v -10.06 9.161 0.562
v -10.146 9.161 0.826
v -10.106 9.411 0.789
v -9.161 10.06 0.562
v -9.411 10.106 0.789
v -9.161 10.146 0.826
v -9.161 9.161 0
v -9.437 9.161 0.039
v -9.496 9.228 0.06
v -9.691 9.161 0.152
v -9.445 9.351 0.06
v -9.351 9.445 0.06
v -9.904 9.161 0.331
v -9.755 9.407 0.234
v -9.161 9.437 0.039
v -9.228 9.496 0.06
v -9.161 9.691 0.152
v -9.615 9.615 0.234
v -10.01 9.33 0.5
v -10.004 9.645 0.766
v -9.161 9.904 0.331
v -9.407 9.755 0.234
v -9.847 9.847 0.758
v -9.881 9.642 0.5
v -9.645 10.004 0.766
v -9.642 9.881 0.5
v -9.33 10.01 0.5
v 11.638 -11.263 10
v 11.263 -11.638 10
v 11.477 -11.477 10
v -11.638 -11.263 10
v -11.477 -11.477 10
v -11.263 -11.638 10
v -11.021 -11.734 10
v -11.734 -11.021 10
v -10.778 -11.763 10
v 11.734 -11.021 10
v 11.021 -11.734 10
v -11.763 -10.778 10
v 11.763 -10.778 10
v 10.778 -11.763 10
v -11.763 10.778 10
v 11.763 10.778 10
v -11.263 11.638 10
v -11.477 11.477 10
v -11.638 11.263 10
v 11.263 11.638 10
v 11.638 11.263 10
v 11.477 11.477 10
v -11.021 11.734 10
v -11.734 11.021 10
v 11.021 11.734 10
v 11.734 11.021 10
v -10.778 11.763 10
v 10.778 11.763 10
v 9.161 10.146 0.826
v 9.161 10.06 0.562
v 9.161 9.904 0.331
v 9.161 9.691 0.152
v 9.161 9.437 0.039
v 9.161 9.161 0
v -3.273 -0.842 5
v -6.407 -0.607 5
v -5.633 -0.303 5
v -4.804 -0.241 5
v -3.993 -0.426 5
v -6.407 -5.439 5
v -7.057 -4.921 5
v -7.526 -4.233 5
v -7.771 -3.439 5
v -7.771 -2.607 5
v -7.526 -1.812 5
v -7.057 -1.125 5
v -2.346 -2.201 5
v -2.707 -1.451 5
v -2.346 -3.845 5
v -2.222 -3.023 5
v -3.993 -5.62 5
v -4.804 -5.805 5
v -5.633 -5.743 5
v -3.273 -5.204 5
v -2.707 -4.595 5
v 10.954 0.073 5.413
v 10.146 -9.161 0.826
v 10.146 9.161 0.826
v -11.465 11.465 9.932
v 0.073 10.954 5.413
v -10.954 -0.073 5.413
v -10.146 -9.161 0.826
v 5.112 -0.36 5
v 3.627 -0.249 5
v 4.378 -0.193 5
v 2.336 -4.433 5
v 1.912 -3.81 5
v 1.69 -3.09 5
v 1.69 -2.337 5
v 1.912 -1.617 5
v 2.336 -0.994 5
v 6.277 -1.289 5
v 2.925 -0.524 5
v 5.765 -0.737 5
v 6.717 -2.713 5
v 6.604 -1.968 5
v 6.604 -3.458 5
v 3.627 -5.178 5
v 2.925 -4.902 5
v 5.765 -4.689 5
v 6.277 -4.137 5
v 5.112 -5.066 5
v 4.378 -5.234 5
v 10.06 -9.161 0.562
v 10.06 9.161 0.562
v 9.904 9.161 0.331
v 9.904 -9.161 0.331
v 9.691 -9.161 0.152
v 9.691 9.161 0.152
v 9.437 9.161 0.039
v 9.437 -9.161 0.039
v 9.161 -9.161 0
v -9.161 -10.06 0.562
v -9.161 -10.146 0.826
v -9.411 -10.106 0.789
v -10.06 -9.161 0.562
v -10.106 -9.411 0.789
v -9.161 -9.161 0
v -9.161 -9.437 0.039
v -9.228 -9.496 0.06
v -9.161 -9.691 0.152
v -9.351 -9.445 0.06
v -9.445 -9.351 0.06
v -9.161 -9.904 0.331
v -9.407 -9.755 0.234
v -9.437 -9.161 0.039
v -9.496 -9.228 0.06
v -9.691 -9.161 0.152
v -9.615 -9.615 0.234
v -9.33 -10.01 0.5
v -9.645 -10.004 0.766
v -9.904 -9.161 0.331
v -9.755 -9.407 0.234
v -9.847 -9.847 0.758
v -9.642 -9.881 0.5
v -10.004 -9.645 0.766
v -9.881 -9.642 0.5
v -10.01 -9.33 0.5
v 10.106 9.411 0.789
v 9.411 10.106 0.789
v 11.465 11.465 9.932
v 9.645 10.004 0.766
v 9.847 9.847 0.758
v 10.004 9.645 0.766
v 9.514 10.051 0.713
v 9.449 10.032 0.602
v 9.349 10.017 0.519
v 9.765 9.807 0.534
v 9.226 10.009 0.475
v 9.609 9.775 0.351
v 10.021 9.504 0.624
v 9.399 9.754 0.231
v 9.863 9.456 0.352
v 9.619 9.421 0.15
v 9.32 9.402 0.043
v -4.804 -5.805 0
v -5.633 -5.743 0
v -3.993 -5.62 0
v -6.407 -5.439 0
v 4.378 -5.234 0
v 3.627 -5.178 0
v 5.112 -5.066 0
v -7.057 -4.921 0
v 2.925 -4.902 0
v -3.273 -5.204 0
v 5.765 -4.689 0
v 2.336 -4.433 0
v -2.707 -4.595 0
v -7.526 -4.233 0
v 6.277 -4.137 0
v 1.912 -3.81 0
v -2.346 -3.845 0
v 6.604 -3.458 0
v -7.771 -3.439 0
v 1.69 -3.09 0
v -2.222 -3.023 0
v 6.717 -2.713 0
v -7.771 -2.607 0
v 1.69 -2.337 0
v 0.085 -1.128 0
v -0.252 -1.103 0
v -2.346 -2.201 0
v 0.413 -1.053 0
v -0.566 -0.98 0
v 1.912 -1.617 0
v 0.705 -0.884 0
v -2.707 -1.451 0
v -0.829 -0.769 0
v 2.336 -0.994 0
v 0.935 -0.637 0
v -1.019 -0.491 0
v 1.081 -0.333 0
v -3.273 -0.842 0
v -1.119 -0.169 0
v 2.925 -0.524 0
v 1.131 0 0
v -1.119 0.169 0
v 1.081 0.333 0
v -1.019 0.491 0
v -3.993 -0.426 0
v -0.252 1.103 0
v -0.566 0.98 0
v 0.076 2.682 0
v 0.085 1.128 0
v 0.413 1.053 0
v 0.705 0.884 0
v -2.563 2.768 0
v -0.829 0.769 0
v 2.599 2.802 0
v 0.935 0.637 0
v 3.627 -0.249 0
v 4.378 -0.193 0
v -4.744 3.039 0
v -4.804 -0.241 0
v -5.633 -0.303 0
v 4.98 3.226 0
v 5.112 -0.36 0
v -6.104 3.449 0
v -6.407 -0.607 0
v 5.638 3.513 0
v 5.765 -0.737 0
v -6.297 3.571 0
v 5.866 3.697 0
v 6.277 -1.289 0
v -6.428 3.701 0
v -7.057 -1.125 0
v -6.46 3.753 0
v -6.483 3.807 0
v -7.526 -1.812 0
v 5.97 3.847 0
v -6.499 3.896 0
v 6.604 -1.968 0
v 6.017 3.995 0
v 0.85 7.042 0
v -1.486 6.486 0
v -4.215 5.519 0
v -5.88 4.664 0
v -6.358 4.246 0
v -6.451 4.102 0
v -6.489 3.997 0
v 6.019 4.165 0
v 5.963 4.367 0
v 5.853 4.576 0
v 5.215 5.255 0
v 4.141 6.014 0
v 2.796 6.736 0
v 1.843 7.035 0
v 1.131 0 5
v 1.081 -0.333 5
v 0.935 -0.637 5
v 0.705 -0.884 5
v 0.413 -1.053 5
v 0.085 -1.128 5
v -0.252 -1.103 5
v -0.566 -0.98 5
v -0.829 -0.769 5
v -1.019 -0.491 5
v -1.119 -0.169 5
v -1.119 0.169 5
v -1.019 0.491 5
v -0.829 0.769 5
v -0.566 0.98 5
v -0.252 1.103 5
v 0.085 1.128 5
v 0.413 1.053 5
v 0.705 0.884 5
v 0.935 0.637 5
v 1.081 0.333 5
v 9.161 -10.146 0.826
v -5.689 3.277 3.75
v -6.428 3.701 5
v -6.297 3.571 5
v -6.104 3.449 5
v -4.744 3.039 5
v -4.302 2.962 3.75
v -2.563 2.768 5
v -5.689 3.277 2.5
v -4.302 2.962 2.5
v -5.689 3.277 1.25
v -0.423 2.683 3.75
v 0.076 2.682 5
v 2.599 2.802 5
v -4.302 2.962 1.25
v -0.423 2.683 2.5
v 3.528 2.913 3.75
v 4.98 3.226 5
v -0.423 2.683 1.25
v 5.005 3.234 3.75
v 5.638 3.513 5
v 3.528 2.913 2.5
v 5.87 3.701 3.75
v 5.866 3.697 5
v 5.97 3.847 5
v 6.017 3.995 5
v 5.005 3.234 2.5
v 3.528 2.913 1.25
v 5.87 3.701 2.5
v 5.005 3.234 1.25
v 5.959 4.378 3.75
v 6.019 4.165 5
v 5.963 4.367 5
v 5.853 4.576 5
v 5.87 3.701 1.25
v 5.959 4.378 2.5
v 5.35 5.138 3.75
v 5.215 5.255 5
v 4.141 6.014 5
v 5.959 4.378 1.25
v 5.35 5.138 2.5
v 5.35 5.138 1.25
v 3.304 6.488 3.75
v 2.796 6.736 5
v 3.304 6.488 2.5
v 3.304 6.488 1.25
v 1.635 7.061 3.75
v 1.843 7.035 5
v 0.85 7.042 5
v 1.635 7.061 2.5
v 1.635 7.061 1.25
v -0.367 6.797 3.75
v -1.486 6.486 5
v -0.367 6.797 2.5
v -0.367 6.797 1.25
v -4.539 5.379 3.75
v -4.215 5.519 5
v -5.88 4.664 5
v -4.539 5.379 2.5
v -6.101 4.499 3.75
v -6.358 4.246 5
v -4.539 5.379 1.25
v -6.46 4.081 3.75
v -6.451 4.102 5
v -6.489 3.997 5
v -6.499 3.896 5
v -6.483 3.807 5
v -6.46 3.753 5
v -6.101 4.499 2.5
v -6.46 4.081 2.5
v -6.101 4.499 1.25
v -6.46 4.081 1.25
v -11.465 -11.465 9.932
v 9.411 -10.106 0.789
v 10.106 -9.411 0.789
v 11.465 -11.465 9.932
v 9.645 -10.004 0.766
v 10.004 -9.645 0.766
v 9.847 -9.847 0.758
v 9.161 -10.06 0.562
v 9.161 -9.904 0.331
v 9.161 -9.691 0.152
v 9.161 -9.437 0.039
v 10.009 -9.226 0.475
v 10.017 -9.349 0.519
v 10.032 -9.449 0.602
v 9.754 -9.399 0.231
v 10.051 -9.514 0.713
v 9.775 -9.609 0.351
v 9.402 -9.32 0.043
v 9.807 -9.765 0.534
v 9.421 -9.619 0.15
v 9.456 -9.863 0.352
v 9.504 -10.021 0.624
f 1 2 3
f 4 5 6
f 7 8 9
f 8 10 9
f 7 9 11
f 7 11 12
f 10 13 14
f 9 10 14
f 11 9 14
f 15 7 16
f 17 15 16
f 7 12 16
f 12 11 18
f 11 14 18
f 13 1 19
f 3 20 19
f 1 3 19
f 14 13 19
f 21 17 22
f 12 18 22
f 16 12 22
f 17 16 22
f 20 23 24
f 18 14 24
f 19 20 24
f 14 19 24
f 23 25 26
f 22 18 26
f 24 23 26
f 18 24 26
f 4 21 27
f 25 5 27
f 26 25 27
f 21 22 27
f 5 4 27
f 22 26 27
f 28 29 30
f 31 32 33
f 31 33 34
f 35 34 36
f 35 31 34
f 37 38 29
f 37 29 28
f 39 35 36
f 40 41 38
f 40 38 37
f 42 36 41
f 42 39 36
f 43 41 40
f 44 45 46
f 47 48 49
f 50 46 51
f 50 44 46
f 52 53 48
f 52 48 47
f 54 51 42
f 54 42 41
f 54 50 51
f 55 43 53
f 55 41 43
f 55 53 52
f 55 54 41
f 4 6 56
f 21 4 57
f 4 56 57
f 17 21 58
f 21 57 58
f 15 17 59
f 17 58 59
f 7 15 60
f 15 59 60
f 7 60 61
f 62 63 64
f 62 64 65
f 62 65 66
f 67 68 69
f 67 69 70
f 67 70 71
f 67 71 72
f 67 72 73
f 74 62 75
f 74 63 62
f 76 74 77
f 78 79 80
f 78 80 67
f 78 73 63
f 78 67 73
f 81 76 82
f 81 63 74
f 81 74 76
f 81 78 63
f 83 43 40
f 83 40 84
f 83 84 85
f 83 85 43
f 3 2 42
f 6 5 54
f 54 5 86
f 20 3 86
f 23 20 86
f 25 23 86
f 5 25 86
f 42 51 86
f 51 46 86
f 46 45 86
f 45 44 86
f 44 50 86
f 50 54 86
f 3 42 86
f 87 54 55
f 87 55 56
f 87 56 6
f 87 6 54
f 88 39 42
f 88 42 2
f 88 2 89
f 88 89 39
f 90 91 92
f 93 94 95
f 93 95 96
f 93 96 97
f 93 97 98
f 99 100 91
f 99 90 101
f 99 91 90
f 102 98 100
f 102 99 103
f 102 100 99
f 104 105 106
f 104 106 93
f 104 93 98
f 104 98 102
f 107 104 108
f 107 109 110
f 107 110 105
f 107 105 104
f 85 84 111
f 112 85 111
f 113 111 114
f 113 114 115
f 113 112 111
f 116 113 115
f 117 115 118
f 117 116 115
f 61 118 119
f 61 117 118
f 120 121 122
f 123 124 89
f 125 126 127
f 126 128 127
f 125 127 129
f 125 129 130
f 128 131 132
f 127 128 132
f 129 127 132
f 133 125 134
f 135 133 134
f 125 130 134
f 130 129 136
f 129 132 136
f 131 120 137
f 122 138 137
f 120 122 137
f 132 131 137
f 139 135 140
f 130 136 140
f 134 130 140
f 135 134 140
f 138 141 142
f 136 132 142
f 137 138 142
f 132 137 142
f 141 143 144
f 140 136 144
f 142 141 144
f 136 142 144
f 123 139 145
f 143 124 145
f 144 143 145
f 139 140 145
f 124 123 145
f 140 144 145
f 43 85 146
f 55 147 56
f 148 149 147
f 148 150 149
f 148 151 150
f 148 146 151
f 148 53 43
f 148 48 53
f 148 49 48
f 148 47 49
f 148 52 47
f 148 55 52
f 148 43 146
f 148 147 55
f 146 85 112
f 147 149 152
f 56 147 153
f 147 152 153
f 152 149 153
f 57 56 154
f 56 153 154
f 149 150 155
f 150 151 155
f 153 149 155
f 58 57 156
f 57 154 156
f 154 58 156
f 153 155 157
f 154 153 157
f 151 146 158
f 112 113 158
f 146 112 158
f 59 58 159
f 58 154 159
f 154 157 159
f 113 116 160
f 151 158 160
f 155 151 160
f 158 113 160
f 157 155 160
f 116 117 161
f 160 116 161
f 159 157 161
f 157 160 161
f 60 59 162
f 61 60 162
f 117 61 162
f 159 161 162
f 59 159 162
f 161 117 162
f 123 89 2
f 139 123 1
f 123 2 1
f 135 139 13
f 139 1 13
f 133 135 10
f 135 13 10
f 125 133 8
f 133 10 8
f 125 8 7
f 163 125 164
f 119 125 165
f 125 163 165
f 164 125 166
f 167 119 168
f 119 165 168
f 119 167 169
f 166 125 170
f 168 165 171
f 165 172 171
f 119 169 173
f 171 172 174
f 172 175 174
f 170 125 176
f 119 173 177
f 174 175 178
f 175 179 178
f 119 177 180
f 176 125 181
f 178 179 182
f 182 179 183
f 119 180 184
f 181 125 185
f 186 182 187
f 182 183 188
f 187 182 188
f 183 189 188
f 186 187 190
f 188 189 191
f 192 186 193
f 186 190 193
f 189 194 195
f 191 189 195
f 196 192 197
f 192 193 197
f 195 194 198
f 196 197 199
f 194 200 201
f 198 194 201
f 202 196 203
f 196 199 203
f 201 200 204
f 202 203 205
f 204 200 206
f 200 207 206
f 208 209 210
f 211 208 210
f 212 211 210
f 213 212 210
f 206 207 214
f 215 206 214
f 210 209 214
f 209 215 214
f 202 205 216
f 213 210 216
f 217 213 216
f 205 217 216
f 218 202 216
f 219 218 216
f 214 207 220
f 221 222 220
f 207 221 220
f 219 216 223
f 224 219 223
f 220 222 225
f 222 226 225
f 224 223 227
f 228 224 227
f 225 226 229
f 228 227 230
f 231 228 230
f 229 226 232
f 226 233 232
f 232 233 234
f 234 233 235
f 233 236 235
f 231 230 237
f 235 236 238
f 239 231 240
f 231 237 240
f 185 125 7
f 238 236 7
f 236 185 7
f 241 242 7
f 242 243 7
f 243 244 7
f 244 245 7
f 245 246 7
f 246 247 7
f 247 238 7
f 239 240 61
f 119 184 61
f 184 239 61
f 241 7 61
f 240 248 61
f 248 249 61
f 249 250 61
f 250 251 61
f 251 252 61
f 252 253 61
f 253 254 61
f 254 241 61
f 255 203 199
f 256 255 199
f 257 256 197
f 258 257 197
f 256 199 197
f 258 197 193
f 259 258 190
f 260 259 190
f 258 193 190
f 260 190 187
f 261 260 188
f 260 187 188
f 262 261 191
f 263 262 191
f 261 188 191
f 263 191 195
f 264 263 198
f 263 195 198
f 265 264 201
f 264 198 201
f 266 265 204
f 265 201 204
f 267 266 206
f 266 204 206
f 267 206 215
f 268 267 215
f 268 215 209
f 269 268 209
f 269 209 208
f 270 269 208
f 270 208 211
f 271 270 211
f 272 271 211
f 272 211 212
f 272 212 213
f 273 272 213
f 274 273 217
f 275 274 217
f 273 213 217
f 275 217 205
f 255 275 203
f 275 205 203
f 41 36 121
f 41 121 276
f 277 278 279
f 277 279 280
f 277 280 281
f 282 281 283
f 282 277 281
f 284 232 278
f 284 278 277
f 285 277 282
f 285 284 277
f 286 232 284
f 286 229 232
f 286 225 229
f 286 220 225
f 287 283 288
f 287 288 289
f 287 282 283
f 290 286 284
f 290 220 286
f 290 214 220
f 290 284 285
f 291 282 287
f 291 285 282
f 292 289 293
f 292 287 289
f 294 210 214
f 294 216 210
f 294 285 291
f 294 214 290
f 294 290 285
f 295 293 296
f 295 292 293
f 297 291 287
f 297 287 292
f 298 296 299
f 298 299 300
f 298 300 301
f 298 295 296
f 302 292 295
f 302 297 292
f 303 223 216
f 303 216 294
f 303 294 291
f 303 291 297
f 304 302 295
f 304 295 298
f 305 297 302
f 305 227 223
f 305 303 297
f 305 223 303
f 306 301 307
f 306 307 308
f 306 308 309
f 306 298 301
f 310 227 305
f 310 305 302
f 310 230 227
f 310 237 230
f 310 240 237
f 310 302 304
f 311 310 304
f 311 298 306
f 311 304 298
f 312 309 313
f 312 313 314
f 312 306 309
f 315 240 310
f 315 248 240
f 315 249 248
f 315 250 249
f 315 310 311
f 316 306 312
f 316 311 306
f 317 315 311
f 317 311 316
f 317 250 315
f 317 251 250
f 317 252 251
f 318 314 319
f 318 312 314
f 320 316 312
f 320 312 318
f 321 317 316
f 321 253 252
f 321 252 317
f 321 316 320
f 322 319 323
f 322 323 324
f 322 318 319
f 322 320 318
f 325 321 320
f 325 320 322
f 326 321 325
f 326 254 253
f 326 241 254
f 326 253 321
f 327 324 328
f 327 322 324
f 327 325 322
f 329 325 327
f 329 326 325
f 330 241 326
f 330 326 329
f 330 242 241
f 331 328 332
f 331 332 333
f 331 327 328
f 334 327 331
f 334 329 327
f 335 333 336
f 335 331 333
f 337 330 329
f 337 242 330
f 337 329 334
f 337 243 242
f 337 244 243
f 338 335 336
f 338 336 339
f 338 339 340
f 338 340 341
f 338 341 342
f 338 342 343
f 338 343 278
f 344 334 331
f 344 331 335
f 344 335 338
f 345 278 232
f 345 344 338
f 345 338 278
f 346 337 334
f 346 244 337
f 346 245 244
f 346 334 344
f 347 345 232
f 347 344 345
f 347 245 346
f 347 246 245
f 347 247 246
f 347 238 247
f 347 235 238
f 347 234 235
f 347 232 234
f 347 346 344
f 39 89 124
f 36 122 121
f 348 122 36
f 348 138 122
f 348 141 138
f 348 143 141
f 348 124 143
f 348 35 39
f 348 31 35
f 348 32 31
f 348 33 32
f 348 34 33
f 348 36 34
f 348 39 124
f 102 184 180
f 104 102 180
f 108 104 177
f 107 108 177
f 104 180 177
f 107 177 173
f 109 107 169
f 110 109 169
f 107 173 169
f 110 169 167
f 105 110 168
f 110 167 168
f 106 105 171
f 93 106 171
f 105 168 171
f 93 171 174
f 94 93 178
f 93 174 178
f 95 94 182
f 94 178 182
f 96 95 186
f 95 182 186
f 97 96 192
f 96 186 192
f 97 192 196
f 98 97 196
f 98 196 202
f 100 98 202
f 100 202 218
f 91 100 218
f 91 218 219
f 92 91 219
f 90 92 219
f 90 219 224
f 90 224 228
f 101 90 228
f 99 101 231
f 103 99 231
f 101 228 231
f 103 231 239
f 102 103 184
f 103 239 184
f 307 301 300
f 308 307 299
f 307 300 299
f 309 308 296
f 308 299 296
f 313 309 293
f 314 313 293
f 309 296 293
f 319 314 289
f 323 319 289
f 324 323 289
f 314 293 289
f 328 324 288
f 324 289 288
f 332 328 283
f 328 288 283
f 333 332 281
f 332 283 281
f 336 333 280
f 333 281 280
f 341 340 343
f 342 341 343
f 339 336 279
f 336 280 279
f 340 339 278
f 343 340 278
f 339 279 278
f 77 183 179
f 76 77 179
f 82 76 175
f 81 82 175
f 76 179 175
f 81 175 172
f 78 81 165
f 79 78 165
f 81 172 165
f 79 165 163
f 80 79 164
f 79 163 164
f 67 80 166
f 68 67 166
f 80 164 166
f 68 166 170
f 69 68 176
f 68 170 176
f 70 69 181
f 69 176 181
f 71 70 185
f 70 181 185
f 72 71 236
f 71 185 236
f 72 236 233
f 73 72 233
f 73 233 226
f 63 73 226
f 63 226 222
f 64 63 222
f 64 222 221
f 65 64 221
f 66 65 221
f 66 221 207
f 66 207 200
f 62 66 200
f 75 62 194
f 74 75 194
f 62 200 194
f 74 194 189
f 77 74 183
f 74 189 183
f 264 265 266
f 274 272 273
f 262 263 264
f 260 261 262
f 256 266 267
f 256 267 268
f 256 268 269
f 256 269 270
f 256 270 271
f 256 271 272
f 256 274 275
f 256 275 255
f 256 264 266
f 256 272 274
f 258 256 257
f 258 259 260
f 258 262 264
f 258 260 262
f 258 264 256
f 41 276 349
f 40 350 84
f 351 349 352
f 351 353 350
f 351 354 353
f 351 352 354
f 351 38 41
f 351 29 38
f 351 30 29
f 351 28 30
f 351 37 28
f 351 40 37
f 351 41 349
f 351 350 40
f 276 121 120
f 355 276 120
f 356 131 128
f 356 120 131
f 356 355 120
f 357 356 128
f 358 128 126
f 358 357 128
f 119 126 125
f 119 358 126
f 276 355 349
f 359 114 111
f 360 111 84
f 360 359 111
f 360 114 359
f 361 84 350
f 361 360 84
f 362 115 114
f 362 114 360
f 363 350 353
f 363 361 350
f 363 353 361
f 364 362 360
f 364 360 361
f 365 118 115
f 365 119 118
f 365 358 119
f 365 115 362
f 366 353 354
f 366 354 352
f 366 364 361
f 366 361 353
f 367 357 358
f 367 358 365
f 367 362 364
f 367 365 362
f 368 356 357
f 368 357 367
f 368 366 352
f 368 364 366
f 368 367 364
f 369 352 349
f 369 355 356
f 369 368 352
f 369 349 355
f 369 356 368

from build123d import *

# Parameters (mm, degrees)
F0_W     = 20
F0_H     = 20
F1_DEPTH = 10
F1_TAPER = -10
F2_R     = 1
F3_R     = 2.7900254732
F3_R_2   = 2.5276520244
F5_DEPTH = 5
F6_R     = 1.1312080983
F6_R_2   = 0.8112646033
F7_DEPTH = 5
F8_DEPTH = 5
F9_DEPTH = 5


with BuildPart() as f1:
    # F0 (on Top) → F1 (new body)
    with BuildSketch(Plane.XY):
        Rectangle(F0_W, F0_H)
    extrude(amount=F1_DEPTH, taper=F1_TAPER)

    # F2
    f2_edges = [f1.edges().sort_by_distance(p)[0] for p in [
        (-10.881635, -10.881635, 5),
        (0, -10, 0),
        (10, 0, 0),
        (10.881635, -10.881635, 5),
        (10.881635, 10.881635, 5),
        (-10.881635, 10.881635, 5),
        (-10, 0, 0),
        (0, 10, 0),
    ]]
    fillet(f2_edges, radius=F2_R)

    # F3 (on face) → F5 (cut)
    with BuildSketch(Plane(origin=(0, 0, 0), x_dir=(1, 0, 0), z_dir=(0, 0, -1))):
        with Locations((-5.0120754167, 3.0229531694)):
            Circle(F3_R)
        with Locations((4.1890102439, 2.713301219)):
            Circle(F3_R_2)
    extrude(amount=-F5_DEPTH, mode=Mode.SUBTRACT)

    # F6 (on face) → F7 (cut)
    with BuildSketch(Plane(origin=(0, 0, 0), x_dir=(1, 0, 0), z_dir=(0, 0, -1))):
        Circle(F6_R)
        Circle(F6_R_2, mode=Mode.SUBTRACT)
    extrude(amount=-F7_DEPTH, mode=Mode.SUBTRACT)

    # F4 (on face) → F8 (cut)
    with BuildSketch(Plane(origin=(0, 0, 0), x_dir=(1, 0, 0), z_dir=(0, 0, -1))):
        with BuildLine():
            add(Edge.make_bspline(
                [(-6.4276270568, -3.7009168882), (-5.5084811908, -2.4301449225), (10.1584902455, -2.1593959712), (2.6631057642, -7.0862087042), (0.4970899152, -7.340655867), (-7.1113923099, -4.6462616335), (-6.4276270568, -3.7009168882)],
                knots=[0, 0, 0, 0, 0.3513337162, 0.546326184, 0.7386380158, 1, 1, 1, 1], degree=3))
        make_face()
    extrude(amount=-F8_DEPTH, mode=Mode.SUBTRACT)

    # F9 (cut): a face of the model
    f9_faces = [f1.faces().sort_by_distance(p)[0] for p in [
        (0, 0, 0),
    ]]
    extrude(f9_faces, amount=-F9_DEPTH, mode=Mode.SUBTRACT)


solid = f1.part
